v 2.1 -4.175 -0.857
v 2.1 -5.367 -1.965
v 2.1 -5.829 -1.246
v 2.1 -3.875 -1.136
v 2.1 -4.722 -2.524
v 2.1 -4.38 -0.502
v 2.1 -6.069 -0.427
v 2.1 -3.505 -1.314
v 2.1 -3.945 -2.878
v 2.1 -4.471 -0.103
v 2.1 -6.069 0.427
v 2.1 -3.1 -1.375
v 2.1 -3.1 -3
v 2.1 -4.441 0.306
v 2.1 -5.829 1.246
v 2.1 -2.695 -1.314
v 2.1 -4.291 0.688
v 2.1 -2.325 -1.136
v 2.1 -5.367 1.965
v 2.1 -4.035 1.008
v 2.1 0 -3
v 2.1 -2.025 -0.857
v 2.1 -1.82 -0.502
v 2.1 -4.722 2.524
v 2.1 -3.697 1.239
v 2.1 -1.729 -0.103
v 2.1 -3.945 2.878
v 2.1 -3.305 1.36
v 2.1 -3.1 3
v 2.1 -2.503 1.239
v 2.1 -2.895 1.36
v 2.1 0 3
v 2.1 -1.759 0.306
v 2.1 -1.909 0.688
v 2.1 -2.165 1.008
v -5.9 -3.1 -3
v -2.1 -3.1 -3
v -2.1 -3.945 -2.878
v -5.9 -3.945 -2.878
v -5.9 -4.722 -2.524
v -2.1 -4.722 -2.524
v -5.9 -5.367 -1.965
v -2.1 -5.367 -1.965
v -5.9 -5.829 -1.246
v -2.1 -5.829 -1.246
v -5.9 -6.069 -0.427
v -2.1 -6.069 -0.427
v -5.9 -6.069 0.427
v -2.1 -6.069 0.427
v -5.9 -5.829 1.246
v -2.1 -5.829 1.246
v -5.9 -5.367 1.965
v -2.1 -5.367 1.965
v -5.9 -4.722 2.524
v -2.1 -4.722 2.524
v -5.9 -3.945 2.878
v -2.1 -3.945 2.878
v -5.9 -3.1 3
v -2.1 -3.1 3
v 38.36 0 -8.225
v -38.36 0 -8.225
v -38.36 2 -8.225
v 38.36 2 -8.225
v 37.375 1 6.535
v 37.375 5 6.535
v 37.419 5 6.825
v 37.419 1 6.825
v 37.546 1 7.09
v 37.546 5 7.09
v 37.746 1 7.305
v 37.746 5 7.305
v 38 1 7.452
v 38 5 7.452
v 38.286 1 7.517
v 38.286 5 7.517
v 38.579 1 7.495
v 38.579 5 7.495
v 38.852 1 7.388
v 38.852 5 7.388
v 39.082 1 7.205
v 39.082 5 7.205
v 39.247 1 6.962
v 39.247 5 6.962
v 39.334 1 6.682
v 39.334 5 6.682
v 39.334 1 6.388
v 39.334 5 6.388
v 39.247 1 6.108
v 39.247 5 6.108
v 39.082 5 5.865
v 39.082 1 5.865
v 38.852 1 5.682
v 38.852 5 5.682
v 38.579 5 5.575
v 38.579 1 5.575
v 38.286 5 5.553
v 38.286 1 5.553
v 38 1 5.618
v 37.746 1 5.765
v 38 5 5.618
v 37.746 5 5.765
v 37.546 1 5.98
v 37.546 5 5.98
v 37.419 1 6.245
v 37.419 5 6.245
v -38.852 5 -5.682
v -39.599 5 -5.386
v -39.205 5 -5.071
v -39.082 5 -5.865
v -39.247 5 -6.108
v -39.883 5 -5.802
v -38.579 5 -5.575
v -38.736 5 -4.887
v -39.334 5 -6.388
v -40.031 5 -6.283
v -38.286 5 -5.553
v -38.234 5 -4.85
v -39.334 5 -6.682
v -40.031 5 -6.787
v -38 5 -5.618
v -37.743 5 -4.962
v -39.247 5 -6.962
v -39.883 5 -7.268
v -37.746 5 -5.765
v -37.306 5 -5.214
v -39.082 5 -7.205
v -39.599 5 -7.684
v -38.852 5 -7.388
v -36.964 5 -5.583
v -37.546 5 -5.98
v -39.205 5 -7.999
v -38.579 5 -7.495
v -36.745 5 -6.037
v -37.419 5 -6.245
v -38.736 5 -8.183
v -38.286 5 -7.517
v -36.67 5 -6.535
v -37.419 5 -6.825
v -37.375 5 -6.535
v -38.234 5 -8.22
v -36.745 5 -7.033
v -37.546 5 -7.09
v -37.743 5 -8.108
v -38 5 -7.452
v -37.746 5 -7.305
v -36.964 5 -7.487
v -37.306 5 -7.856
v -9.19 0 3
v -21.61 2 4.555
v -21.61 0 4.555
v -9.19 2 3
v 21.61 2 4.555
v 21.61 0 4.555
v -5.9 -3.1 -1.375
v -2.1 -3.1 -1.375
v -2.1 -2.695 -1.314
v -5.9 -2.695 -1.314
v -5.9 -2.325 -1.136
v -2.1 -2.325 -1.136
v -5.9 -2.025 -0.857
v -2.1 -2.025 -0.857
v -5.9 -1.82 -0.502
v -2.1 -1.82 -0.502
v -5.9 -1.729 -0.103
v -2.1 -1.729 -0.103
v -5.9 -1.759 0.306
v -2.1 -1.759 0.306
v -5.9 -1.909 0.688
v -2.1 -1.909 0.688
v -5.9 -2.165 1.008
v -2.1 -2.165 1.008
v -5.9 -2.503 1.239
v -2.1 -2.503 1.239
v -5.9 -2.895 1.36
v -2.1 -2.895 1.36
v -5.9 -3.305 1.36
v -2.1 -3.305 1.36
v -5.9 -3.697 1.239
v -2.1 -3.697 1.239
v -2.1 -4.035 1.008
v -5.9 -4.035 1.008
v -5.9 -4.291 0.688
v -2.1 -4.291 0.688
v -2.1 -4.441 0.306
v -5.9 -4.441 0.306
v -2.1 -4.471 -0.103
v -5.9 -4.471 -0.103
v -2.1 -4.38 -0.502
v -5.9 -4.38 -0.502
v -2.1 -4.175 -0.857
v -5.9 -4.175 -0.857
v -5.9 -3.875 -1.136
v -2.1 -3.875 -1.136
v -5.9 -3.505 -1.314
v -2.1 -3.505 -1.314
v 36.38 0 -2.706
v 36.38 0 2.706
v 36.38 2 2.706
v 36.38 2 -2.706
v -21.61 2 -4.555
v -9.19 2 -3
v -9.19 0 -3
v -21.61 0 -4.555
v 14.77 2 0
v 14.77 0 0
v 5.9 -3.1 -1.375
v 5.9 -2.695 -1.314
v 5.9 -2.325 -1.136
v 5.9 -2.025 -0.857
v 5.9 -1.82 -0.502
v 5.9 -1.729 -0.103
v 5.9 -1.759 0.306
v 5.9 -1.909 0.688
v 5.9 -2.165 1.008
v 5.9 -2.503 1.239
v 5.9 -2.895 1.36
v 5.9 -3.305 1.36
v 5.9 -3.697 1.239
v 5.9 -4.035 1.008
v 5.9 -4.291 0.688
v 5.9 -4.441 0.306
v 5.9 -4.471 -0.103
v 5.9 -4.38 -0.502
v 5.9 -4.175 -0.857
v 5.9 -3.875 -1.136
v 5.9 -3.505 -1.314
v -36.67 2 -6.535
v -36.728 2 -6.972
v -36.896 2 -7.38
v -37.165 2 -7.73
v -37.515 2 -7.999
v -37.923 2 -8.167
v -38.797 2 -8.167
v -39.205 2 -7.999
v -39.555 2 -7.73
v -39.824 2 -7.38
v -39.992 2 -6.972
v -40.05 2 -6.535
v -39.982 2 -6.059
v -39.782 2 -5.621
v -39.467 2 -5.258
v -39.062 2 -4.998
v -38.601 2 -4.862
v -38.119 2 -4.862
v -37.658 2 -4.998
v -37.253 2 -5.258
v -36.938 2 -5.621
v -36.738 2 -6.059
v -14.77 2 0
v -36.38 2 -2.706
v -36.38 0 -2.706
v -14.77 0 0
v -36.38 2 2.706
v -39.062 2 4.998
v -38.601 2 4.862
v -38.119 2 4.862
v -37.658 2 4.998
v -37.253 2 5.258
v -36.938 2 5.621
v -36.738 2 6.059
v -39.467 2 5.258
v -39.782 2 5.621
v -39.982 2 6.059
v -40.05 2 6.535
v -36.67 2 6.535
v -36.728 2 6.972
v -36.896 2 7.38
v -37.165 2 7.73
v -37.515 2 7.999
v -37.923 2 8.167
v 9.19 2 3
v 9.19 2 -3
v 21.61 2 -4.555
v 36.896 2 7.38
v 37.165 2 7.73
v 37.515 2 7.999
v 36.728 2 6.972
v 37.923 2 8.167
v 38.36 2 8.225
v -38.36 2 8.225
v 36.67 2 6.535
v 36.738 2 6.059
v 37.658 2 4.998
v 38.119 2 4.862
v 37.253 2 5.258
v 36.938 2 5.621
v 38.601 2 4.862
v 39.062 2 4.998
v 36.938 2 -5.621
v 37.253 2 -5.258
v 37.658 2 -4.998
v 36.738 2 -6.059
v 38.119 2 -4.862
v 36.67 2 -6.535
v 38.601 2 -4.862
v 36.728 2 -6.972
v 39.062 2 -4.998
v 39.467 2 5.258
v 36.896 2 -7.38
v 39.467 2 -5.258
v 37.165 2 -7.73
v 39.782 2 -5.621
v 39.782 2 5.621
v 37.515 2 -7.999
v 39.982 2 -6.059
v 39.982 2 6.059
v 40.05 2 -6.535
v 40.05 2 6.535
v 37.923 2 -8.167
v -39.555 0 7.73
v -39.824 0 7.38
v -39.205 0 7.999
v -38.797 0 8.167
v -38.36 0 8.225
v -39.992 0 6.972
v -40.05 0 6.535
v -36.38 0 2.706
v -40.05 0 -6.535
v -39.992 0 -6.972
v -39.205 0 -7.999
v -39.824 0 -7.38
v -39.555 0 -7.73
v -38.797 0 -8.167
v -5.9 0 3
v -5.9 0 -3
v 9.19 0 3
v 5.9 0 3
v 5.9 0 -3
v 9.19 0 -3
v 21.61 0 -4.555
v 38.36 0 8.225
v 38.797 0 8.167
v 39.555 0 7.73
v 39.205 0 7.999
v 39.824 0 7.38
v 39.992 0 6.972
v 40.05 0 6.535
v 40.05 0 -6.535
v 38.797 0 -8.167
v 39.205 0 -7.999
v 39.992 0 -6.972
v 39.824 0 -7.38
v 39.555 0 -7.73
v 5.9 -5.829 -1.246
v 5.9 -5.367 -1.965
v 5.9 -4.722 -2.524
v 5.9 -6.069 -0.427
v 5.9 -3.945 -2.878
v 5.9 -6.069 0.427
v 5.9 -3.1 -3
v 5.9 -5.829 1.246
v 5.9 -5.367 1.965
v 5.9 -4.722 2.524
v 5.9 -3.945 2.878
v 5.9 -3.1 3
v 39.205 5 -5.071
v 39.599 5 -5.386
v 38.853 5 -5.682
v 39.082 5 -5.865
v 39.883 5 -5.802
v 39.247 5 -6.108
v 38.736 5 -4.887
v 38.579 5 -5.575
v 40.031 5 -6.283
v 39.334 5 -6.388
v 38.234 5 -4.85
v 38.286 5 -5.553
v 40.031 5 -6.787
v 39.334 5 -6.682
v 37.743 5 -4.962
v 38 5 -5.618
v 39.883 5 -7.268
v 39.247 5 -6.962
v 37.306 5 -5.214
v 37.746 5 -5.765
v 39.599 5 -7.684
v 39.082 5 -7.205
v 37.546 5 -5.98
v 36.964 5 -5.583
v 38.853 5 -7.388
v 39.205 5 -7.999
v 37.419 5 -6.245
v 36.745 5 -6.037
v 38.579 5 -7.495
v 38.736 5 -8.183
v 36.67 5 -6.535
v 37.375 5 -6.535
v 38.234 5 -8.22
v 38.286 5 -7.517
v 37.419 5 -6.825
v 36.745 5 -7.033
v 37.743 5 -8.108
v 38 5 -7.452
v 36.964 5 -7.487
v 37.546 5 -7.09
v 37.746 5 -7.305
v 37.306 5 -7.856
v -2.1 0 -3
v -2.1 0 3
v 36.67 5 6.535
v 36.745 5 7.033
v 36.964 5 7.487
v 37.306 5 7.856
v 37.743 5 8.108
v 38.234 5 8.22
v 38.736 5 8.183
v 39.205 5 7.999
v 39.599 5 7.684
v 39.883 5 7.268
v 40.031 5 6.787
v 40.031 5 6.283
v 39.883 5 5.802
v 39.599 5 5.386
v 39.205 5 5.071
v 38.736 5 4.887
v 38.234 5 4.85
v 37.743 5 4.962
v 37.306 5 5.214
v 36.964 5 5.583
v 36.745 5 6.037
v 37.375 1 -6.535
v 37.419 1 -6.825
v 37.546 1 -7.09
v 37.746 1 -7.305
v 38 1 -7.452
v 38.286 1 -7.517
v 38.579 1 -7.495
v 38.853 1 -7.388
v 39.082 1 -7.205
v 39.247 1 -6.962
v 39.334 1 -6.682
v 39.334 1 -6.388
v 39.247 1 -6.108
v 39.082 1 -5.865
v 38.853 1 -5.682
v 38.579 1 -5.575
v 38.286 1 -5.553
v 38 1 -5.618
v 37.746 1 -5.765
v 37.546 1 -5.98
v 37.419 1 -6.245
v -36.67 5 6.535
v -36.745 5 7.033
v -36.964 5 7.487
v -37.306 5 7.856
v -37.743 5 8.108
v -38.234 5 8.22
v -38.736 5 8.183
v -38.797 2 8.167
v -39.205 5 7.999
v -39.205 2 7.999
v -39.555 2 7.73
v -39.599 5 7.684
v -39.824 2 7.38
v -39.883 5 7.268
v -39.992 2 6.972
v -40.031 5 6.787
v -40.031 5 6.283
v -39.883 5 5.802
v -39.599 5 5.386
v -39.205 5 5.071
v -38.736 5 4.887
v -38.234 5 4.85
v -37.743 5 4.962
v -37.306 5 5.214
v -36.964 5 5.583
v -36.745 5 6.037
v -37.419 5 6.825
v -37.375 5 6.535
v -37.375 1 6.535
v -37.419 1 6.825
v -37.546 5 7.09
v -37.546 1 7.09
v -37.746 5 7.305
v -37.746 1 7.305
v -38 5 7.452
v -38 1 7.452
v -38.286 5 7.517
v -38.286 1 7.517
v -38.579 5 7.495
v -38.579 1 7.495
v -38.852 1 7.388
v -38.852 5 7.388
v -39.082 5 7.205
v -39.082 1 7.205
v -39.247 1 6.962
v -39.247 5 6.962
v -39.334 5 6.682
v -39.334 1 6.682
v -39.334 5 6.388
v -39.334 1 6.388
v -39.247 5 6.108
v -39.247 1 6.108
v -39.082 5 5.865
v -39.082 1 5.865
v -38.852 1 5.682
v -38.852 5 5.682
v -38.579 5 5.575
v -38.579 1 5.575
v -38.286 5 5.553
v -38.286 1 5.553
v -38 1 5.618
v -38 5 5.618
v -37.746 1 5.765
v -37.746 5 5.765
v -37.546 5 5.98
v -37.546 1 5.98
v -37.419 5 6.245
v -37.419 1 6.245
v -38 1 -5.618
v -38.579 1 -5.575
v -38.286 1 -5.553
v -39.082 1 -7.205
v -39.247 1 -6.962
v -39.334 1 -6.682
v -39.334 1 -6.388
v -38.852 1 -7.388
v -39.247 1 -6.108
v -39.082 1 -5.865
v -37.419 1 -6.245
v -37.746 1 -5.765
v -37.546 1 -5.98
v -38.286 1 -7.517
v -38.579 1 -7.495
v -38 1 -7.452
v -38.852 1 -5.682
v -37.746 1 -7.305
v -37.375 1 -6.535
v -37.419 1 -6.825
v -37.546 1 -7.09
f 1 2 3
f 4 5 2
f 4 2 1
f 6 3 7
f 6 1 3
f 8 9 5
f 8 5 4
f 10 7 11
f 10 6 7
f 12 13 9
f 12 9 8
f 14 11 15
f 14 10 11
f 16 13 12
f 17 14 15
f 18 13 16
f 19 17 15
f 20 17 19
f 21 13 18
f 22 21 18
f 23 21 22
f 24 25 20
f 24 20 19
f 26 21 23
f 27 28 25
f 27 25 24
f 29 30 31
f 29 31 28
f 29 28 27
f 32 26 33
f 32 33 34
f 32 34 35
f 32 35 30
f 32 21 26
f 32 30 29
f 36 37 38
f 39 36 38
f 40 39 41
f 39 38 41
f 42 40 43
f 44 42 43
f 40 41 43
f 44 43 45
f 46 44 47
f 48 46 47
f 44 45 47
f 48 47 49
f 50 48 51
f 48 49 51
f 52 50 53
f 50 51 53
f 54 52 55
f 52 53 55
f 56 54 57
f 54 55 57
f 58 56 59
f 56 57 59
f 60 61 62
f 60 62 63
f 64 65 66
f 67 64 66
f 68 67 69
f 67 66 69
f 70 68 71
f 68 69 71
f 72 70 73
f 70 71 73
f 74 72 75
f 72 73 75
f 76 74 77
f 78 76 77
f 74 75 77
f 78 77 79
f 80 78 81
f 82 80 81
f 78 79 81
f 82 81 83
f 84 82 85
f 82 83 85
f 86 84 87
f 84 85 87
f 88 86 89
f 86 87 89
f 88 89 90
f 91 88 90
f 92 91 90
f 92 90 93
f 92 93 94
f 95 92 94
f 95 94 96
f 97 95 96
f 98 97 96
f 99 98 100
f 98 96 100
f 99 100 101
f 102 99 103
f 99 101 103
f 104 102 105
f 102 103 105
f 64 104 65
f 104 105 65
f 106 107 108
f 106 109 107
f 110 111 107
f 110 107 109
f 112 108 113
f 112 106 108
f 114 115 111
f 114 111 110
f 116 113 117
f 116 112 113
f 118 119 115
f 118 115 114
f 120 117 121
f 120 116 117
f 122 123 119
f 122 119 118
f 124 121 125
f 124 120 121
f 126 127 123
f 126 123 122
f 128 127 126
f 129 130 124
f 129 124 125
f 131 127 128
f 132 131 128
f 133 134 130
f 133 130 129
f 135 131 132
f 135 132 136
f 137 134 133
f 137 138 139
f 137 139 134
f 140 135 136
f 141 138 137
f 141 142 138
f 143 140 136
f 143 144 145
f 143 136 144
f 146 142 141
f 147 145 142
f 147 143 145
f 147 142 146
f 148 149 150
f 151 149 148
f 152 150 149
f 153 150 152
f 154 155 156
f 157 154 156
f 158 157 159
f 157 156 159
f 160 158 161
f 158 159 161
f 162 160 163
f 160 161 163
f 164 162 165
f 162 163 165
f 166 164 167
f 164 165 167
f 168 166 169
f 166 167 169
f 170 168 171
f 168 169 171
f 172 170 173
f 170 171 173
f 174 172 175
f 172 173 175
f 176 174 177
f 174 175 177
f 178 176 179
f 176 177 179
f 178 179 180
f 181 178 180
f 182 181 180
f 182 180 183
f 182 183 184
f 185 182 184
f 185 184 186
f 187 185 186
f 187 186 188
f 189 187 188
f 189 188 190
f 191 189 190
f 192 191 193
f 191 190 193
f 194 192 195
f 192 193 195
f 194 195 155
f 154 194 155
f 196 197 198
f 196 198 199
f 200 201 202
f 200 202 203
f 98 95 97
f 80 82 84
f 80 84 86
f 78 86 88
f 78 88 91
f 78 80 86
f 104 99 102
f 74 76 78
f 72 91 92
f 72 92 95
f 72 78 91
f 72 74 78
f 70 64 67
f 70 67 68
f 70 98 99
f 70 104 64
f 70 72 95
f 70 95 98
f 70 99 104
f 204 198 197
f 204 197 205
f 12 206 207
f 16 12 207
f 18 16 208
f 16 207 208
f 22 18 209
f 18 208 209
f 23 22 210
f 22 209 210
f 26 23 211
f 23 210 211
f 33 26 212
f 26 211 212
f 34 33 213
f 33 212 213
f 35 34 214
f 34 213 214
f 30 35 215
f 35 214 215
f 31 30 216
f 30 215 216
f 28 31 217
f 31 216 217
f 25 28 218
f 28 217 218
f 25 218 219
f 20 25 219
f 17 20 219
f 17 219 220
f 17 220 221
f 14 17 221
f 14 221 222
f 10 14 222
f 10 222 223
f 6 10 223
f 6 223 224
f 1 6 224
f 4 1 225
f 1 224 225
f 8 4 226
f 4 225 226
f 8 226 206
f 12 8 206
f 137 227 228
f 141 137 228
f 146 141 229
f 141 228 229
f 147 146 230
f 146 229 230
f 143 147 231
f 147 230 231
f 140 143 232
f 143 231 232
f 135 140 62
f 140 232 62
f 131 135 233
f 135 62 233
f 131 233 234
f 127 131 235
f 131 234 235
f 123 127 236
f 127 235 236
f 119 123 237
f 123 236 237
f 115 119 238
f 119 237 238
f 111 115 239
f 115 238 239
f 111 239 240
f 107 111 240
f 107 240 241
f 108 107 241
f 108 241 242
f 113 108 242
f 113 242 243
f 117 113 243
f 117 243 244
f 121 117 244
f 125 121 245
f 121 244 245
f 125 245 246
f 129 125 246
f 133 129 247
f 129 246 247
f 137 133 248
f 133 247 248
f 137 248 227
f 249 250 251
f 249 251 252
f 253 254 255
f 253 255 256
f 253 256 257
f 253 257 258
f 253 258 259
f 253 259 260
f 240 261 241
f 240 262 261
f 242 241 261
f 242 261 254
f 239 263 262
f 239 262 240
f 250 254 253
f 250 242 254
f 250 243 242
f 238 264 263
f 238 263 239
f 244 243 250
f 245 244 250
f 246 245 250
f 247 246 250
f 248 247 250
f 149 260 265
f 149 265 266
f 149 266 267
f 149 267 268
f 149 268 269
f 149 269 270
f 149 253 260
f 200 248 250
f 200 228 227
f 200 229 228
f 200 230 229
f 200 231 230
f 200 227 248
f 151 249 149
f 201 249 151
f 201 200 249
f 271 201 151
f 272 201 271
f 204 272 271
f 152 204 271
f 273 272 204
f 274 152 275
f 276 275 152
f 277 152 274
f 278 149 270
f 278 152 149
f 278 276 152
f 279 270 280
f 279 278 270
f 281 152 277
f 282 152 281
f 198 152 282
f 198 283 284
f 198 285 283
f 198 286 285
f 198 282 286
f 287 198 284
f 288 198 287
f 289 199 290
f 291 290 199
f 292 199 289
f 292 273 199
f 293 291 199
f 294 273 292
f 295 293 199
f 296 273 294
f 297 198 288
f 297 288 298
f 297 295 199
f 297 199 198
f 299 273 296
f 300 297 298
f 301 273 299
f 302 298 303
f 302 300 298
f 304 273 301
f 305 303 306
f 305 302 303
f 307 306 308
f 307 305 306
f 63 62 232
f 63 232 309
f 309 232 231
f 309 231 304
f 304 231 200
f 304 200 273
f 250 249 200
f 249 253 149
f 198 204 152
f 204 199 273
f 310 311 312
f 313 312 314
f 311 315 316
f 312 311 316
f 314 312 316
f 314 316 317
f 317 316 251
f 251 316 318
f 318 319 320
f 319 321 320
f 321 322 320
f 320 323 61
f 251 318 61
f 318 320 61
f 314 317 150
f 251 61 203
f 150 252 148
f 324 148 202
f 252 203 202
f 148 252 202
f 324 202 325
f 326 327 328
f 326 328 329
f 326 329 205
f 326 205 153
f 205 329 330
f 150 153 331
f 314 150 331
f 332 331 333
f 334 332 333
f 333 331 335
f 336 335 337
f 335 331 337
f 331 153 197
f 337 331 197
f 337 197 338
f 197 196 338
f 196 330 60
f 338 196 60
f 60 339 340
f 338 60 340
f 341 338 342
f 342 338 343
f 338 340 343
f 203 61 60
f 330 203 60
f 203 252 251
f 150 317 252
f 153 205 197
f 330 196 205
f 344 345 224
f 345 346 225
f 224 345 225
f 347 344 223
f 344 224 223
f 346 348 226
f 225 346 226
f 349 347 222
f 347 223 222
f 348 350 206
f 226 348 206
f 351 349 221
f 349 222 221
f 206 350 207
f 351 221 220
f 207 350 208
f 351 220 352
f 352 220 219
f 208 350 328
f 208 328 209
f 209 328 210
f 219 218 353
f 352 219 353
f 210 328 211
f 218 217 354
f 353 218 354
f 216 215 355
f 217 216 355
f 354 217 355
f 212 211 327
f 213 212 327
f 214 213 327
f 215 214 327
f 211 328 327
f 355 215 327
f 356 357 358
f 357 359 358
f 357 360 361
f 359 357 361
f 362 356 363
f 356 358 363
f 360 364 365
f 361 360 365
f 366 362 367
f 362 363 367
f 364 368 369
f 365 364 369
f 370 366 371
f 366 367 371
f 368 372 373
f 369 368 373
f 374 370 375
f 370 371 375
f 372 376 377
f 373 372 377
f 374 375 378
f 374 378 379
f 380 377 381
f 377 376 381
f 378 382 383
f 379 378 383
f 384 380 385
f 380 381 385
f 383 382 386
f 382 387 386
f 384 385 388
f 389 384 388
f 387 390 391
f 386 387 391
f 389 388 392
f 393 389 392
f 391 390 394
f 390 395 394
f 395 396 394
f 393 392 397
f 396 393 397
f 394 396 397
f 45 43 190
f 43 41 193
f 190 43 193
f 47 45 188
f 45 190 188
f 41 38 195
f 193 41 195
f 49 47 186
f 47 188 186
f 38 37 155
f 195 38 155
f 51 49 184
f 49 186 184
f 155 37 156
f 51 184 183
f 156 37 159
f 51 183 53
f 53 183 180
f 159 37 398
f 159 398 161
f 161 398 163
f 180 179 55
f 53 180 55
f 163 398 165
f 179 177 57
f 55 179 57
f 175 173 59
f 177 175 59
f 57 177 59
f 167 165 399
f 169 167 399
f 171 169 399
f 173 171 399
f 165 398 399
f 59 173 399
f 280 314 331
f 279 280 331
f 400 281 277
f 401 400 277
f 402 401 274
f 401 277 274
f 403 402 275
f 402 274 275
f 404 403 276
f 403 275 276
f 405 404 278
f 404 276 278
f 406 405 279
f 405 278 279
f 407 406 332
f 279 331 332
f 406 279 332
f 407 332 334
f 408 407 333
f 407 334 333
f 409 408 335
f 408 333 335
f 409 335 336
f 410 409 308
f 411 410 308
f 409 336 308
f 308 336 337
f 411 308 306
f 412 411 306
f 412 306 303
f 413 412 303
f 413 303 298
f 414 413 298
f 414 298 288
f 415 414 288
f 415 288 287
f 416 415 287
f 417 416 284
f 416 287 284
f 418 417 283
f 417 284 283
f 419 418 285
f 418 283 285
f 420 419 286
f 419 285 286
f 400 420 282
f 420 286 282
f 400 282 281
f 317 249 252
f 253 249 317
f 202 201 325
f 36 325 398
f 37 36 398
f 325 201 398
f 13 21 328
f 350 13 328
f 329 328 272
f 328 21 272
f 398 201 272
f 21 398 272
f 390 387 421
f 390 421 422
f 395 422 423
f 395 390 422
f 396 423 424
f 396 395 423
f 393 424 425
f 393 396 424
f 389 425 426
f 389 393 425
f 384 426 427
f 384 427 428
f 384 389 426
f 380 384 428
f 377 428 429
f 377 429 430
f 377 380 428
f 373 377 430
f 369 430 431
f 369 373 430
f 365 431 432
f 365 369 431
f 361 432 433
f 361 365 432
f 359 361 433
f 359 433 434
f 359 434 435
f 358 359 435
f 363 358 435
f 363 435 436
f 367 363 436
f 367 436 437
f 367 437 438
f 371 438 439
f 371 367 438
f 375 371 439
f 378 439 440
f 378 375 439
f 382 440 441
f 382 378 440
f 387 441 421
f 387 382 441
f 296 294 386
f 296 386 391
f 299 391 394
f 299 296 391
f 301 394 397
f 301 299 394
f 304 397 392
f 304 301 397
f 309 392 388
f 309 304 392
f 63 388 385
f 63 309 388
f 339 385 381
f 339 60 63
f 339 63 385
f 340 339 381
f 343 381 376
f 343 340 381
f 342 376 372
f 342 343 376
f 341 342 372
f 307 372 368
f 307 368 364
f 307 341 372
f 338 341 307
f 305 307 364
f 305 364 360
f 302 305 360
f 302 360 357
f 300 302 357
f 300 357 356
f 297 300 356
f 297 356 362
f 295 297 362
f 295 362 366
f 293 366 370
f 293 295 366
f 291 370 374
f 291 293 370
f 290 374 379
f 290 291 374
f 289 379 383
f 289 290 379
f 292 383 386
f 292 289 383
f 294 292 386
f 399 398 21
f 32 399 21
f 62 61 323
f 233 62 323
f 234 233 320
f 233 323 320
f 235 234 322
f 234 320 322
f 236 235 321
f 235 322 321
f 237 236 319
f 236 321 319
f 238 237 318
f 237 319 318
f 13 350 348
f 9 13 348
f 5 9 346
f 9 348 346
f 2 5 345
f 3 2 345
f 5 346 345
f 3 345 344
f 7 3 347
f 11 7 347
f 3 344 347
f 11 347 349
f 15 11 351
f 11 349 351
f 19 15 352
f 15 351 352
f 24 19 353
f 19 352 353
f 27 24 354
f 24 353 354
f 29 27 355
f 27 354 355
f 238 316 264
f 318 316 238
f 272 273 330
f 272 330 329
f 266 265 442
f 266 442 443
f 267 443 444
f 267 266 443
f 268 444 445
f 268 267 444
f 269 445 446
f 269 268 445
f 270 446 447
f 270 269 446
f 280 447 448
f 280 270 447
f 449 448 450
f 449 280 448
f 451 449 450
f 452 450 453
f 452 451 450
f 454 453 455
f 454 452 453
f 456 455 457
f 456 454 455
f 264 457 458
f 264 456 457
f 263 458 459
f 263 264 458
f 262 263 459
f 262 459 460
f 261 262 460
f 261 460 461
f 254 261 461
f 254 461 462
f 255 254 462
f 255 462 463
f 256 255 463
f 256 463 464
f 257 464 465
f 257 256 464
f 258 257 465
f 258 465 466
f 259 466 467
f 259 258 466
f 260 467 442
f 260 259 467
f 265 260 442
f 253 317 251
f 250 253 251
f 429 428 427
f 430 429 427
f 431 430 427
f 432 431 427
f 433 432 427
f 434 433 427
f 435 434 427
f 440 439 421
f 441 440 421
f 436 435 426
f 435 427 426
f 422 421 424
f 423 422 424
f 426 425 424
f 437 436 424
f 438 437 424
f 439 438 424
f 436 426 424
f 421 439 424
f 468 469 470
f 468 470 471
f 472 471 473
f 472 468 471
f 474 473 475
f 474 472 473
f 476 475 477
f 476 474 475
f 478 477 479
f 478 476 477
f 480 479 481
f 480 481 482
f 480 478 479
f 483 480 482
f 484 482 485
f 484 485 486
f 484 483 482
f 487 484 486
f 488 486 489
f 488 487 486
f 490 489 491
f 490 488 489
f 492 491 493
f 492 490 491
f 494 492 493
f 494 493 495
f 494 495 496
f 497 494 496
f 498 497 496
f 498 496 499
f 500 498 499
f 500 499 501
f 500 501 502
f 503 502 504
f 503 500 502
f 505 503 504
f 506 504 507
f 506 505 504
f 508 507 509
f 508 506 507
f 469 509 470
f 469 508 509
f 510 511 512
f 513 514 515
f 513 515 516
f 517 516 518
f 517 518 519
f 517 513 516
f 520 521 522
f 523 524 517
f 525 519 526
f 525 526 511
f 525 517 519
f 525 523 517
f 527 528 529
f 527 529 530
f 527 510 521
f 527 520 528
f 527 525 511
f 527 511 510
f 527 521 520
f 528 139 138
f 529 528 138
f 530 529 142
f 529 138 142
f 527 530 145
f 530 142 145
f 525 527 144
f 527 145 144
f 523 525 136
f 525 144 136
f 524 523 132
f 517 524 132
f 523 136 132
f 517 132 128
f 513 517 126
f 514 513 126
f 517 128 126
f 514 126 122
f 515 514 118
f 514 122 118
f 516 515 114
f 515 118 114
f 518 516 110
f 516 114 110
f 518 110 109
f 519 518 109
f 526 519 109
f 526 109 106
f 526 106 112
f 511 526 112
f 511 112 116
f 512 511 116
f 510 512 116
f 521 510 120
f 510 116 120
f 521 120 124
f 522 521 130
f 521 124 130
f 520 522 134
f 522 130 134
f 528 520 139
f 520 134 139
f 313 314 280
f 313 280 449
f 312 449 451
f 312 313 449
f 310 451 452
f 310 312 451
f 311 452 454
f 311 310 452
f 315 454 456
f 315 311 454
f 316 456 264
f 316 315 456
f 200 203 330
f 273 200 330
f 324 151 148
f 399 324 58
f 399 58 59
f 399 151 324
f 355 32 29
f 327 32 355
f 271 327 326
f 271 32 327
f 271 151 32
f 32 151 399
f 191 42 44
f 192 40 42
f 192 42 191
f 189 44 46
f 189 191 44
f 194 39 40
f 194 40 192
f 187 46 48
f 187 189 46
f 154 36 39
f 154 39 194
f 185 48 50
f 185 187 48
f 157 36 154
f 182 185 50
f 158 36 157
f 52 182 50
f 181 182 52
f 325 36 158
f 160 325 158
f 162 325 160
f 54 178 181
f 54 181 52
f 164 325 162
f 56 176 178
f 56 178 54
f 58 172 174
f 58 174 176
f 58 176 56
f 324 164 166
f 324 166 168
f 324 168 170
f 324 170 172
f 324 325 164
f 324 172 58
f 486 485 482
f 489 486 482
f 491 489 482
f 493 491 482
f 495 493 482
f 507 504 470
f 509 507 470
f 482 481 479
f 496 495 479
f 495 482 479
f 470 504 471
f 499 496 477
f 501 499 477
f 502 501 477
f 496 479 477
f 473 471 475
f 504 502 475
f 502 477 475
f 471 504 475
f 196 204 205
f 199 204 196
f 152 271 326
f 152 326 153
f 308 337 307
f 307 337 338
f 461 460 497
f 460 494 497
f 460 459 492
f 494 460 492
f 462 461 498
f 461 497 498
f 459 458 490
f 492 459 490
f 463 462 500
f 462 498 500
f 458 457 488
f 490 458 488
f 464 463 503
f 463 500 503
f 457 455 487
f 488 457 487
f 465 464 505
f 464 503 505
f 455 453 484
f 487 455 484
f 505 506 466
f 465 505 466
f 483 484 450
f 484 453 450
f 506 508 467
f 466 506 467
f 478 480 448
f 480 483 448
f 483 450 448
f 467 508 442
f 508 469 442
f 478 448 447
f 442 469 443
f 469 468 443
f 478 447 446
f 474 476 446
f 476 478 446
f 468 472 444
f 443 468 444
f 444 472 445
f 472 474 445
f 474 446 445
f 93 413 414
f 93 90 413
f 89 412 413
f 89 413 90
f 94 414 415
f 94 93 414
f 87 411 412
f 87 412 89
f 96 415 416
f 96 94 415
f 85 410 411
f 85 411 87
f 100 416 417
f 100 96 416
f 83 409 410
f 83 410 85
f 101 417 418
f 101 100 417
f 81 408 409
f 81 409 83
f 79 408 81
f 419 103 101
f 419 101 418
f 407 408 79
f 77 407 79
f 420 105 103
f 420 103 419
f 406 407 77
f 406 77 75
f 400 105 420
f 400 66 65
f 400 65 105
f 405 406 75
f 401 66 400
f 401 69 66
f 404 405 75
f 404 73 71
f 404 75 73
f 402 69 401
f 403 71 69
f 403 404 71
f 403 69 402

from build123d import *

# Parameters (mm, degrees)
SKETCH2_W               = 80.1
SKETCH2_H               = 16.45
SKETCH2_W_2             = 72.76
SKETCH2_H_2             = 9.11
EXTRUDE_THIN1_DEPTH     = 2
EXTRUDE_THIN2_DEPTH     = 2
SKETCH6_W               = 18.3804486
SKETCH6_H               = 6
BOSS_EXTRUDE2_DEPTH     = 2
SKETCH7_R               = 1.375
BOSS_EXTRUDE3_DEPTH     = 3.8
LPATTERN1_COUNT         = 2
LPATTERN1_PITCH         = 8
FILLET2_R               = 1.69
SKETCH8_R               = 1.69
BOSS_EXTRUDE4_DEPTH     = 3
CUT_EXTRUDE1_START      = 3
SKETCH4_R               = 0.985
CUT_EXTRUDE1_DEPTH      = 4
MIRROR2_COPY_1_SKETCH_R = 1.69
MIRROR2_COPY_1_DEPTH    = 3
MIRROR2_START           = 3
MIRROR2_COPY_2_SKETCH_R = 0.985
MIRROR2_COPY_2_DEPTH    = 4


with BuildPart() as part:
    # Sketch2 → Extrude-Thin1 (new body)
    with BuildSketch(Plane(origin=(0, 0, 0), x_dir=(1, 0, 0), z_dir=(0, 1, 0))):
        Rectangle(SKETCH2_W, SKETCH2_H)
        Rectangle(SKETCH2_W_2, SKETCH2_H_2, mode=Mode.SUBTRACT)
    extrude(amount=EXTRUDE_THIN1_DEPTH)

    # Sketch3 → Extrude-Thin2 (add, through all)
    with BuildSketch(Plane(origin=(0, 2, 0), x_dir=(1, 0, 0), z_dir=(0, 1, 0))):
        Polygon((-36.607973326, 2.734216333), (36.152026674, -6.375783667), (36.607973326, -2.734216333), (-36.152026674, 6.375783667), align=None)
        Polygon((36.152026674, 6.375783667), (-36.607973326, -2.734216333), (-36.152026674, -6.375783667), (36.607973326, 2.734216333), align=None)
    extrude(amount=-EXTRUDE_THIN2_DEPTH)

    # Sketch6 → Boss-Extrude2 (add, through all)
    with BuildSketch(Plane(origin=(0, 2, 0), x_dir=(1, 0, 0), z_dir=(0, 1, 0))):
        Rectangle(SKETCH6_W, SKETCH6_H)
    extrude(amount=-BOSS_EXTRUDE2_DEPTH)

    # Sketch7 → Boss-Extrude3 (add)
    with BuildSketch(Plane(origin=(5.9, 0, 0), x_dir=(0, 0, -1), z_dir=(1, 0, 0))):
        with BuildLine():
            Line((-3, -3.1), (-3, 0))
            Line((-3, 0), (3, 0))
            Line((3, 0), (3, -3.1))
            ThreePointArc((3, -3.1), (0, -6.1), (-3, -3.1))
        make_face()
        with Locations((0, -3.1)):
            Circle(SKETCH7_R, mode=Mode.SUBTRACT)
    boss_extrude3 = extrude(amount=-BOSS_EXTRUDE3_DEPTH)

    # LPattern1: Boss-Extrude3 ×2
    with Locations(*[(-i * LPATTERN1_PITCH, 0, 0) for i in range(1, LPATTERN1_COUNT)]):
        add(boss_extrude3)

    # Fillet2
    fillet2_edges = [part.edges().sort_by_distance(p)[0] for p in [
        (40.05, 1, 8.225),
        (-40.05, 1, 8.225),
        (-40.05, 1, -8.225),
        (40.05, 1, -8.225),
    ]]
    fillet(fillet2_edges, radius=FILLET2_R)

    # Sketch8 → Boss-Extrude4 (add)
    with BuildSketch(Plane(origin=(0, 2, 0), x_dir=(1, 0, 0), z_dir=(0, 1, 0))):
        with Locations((-38.36, 6.535)):
            Circle(SKETCH8_R)
    boss_extrude4 = extrude(amount=BOSS_EXTRUDE4_DEPTH)

    # Sketch4 → Cut-Extrude1 (cut)
    with BuildSketch(Plane(origin=(0, 2, 0), x_dir=(1, 0, 0), z_dir=(0, 1, 0)).offset(CUT_EXTRUDE1_START)):
        with Locations((-38.36, 6.535)):
            Circle(SKETCH4_R)
    cut_extrude1 = extrude(amount=-CUT_EXTRUDE1_DEPTH, mode=Mode.SUBTRACT)

    # Mirror1: Boss-Extrude4, Cut-Extrude1 across plane
    add(boss_extrude4.mirror(Plane.XY))
    add(cut_extrude1.mirror(Plane.XY), mode=Mode.SUBTRACT)

    # Mirror2: Boss-Extrude4, Cut-Extrude1 across plane
    add(boss_extrude4.mirror(Plane(origin=(0, 0, 0), x_dir=(0, 0, 1), z_dir=(1, 0, 0))))
    add(cut_extrude1.mirror(Plane(origin=(0, 0, 0), x_dir=(0, 0, 1), z_dir=(1, 0, 0))), mode=Mode.SUBTRACT)

    # Mirror2 copy 1 sketch → Mirror2 copy 1 (add)
    with BuildSketch(Plane(origin=(0, 2, 0), x_dir=(-1, 0, 0), z_dir=(0, 1, 0))):
        with Locations((-38.36, 6.535)):
            Circle(MIRROR2_COPY_1_SKETCH_R)
    extrude(amount=MIRROR2_COPY_1_DEPTH)

    # Mirror2 copy 2 sketch → Mirror2 copy 2 (cut)
    with BuildSketch(Plane(origin=(0, 2, 0), x_dir=(-1, 0, 0), z_dir=(0, 1, 0)).offset(MIRROR2_START)):
        with Locations((-38.36, 6.535)):
            Circle(MIRROR2_COPY_2_SKETCH_R)
    extrude(amount=-MIRROR2_COPY_2_DEPTH, mode=Mode.SUBTRACT)


solid = part.part
